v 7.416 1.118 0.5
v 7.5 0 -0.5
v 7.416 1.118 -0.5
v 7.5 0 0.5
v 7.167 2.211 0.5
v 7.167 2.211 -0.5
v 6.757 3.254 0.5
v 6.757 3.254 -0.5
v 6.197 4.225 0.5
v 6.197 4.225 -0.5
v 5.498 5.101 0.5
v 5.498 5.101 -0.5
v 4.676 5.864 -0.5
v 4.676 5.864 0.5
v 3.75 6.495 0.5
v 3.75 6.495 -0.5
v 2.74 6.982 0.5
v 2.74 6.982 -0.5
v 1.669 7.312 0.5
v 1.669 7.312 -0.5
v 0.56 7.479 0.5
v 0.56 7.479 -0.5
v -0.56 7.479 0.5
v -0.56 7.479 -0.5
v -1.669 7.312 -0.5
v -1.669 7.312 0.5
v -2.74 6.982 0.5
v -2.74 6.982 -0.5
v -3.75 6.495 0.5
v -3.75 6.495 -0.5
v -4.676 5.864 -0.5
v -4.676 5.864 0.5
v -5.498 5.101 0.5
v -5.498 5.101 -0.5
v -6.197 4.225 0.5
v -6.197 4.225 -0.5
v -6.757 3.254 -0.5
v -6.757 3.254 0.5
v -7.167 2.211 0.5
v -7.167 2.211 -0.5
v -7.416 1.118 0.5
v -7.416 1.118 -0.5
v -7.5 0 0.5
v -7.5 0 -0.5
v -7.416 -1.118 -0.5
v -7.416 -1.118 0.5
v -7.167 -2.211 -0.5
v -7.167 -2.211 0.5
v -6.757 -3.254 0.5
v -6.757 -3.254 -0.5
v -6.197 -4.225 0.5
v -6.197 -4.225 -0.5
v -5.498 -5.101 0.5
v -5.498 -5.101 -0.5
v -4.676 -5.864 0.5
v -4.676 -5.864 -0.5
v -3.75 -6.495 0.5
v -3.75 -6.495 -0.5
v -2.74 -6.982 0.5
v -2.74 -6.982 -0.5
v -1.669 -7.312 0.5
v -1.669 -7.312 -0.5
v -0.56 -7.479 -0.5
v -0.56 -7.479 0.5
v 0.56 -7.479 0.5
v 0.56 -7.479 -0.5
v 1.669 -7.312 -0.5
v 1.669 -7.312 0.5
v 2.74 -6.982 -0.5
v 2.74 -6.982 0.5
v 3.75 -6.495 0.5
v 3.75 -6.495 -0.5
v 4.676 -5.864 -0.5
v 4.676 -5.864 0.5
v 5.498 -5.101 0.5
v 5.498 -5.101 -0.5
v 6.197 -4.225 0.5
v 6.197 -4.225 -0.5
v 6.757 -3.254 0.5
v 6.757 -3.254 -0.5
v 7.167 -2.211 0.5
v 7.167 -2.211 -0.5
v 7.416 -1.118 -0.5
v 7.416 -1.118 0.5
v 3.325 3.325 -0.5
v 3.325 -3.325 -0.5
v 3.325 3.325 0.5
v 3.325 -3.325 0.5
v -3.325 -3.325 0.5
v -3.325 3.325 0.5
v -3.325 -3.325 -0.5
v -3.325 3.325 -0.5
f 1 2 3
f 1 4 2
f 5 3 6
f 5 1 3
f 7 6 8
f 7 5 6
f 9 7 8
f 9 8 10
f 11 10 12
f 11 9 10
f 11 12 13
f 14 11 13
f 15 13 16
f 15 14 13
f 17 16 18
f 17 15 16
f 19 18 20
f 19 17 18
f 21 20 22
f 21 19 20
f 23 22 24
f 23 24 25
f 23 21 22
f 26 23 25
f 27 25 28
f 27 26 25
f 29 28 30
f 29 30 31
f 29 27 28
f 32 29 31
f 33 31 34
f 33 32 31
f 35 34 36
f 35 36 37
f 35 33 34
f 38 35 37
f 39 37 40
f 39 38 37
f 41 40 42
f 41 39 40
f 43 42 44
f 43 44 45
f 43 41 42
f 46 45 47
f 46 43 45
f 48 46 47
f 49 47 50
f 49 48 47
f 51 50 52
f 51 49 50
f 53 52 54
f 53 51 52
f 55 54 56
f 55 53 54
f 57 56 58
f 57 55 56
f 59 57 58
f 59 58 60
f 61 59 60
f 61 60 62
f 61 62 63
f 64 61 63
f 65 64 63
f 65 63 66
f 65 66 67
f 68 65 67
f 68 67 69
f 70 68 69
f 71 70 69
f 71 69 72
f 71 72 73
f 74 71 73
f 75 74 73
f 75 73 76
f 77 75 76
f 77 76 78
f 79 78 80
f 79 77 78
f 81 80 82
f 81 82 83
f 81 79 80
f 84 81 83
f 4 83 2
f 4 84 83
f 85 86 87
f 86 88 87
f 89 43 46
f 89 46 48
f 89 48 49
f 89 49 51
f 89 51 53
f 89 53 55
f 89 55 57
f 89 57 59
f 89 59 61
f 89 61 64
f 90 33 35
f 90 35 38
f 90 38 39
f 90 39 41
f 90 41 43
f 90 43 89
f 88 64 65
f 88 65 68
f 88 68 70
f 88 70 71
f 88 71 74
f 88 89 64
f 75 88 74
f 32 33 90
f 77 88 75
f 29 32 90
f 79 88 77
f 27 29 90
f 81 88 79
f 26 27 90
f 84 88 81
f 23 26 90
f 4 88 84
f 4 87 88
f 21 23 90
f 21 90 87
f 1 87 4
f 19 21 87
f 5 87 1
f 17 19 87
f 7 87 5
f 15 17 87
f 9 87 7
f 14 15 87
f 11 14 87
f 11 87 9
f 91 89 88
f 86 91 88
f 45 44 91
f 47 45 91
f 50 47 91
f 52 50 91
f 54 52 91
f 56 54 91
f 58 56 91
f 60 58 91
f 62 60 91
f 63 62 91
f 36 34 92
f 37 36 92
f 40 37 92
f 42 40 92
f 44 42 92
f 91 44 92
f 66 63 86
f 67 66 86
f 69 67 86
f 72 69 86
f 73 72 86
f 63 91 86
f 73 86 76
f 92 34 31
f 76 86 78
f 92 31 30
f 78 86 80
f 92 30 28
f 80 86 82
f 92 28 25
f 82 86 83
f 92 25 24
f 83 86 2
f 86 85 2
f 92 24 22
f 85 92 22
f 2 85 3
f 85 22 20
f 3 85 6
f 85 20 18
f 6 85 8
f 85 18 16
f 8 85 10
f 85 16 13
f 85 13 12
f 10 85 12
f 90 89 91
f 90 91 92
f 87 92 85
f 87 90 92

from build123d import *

# Parameters (mm, degrees)
SKETCH1_R           = 7.5
SKETCH1_W           = 6.65
SKETCH1_H           = 6.65
BOSS_EXTRUDE1_DEPTH = 0.5


with BuildPart() as part:
    # Sketch1 → Boss-Extrude1 (new, symmetric)
    with BuildSketch(Plane.XY):
        Circle(SKETCH1_R)
        Rectangle(SKETCH1_W, SKETCH1_H, mode=Mode.SUBTRACT)
    extrude(amount=BOSS_EXTRUDE1_DEPTH, both=True)


solid = part.part
